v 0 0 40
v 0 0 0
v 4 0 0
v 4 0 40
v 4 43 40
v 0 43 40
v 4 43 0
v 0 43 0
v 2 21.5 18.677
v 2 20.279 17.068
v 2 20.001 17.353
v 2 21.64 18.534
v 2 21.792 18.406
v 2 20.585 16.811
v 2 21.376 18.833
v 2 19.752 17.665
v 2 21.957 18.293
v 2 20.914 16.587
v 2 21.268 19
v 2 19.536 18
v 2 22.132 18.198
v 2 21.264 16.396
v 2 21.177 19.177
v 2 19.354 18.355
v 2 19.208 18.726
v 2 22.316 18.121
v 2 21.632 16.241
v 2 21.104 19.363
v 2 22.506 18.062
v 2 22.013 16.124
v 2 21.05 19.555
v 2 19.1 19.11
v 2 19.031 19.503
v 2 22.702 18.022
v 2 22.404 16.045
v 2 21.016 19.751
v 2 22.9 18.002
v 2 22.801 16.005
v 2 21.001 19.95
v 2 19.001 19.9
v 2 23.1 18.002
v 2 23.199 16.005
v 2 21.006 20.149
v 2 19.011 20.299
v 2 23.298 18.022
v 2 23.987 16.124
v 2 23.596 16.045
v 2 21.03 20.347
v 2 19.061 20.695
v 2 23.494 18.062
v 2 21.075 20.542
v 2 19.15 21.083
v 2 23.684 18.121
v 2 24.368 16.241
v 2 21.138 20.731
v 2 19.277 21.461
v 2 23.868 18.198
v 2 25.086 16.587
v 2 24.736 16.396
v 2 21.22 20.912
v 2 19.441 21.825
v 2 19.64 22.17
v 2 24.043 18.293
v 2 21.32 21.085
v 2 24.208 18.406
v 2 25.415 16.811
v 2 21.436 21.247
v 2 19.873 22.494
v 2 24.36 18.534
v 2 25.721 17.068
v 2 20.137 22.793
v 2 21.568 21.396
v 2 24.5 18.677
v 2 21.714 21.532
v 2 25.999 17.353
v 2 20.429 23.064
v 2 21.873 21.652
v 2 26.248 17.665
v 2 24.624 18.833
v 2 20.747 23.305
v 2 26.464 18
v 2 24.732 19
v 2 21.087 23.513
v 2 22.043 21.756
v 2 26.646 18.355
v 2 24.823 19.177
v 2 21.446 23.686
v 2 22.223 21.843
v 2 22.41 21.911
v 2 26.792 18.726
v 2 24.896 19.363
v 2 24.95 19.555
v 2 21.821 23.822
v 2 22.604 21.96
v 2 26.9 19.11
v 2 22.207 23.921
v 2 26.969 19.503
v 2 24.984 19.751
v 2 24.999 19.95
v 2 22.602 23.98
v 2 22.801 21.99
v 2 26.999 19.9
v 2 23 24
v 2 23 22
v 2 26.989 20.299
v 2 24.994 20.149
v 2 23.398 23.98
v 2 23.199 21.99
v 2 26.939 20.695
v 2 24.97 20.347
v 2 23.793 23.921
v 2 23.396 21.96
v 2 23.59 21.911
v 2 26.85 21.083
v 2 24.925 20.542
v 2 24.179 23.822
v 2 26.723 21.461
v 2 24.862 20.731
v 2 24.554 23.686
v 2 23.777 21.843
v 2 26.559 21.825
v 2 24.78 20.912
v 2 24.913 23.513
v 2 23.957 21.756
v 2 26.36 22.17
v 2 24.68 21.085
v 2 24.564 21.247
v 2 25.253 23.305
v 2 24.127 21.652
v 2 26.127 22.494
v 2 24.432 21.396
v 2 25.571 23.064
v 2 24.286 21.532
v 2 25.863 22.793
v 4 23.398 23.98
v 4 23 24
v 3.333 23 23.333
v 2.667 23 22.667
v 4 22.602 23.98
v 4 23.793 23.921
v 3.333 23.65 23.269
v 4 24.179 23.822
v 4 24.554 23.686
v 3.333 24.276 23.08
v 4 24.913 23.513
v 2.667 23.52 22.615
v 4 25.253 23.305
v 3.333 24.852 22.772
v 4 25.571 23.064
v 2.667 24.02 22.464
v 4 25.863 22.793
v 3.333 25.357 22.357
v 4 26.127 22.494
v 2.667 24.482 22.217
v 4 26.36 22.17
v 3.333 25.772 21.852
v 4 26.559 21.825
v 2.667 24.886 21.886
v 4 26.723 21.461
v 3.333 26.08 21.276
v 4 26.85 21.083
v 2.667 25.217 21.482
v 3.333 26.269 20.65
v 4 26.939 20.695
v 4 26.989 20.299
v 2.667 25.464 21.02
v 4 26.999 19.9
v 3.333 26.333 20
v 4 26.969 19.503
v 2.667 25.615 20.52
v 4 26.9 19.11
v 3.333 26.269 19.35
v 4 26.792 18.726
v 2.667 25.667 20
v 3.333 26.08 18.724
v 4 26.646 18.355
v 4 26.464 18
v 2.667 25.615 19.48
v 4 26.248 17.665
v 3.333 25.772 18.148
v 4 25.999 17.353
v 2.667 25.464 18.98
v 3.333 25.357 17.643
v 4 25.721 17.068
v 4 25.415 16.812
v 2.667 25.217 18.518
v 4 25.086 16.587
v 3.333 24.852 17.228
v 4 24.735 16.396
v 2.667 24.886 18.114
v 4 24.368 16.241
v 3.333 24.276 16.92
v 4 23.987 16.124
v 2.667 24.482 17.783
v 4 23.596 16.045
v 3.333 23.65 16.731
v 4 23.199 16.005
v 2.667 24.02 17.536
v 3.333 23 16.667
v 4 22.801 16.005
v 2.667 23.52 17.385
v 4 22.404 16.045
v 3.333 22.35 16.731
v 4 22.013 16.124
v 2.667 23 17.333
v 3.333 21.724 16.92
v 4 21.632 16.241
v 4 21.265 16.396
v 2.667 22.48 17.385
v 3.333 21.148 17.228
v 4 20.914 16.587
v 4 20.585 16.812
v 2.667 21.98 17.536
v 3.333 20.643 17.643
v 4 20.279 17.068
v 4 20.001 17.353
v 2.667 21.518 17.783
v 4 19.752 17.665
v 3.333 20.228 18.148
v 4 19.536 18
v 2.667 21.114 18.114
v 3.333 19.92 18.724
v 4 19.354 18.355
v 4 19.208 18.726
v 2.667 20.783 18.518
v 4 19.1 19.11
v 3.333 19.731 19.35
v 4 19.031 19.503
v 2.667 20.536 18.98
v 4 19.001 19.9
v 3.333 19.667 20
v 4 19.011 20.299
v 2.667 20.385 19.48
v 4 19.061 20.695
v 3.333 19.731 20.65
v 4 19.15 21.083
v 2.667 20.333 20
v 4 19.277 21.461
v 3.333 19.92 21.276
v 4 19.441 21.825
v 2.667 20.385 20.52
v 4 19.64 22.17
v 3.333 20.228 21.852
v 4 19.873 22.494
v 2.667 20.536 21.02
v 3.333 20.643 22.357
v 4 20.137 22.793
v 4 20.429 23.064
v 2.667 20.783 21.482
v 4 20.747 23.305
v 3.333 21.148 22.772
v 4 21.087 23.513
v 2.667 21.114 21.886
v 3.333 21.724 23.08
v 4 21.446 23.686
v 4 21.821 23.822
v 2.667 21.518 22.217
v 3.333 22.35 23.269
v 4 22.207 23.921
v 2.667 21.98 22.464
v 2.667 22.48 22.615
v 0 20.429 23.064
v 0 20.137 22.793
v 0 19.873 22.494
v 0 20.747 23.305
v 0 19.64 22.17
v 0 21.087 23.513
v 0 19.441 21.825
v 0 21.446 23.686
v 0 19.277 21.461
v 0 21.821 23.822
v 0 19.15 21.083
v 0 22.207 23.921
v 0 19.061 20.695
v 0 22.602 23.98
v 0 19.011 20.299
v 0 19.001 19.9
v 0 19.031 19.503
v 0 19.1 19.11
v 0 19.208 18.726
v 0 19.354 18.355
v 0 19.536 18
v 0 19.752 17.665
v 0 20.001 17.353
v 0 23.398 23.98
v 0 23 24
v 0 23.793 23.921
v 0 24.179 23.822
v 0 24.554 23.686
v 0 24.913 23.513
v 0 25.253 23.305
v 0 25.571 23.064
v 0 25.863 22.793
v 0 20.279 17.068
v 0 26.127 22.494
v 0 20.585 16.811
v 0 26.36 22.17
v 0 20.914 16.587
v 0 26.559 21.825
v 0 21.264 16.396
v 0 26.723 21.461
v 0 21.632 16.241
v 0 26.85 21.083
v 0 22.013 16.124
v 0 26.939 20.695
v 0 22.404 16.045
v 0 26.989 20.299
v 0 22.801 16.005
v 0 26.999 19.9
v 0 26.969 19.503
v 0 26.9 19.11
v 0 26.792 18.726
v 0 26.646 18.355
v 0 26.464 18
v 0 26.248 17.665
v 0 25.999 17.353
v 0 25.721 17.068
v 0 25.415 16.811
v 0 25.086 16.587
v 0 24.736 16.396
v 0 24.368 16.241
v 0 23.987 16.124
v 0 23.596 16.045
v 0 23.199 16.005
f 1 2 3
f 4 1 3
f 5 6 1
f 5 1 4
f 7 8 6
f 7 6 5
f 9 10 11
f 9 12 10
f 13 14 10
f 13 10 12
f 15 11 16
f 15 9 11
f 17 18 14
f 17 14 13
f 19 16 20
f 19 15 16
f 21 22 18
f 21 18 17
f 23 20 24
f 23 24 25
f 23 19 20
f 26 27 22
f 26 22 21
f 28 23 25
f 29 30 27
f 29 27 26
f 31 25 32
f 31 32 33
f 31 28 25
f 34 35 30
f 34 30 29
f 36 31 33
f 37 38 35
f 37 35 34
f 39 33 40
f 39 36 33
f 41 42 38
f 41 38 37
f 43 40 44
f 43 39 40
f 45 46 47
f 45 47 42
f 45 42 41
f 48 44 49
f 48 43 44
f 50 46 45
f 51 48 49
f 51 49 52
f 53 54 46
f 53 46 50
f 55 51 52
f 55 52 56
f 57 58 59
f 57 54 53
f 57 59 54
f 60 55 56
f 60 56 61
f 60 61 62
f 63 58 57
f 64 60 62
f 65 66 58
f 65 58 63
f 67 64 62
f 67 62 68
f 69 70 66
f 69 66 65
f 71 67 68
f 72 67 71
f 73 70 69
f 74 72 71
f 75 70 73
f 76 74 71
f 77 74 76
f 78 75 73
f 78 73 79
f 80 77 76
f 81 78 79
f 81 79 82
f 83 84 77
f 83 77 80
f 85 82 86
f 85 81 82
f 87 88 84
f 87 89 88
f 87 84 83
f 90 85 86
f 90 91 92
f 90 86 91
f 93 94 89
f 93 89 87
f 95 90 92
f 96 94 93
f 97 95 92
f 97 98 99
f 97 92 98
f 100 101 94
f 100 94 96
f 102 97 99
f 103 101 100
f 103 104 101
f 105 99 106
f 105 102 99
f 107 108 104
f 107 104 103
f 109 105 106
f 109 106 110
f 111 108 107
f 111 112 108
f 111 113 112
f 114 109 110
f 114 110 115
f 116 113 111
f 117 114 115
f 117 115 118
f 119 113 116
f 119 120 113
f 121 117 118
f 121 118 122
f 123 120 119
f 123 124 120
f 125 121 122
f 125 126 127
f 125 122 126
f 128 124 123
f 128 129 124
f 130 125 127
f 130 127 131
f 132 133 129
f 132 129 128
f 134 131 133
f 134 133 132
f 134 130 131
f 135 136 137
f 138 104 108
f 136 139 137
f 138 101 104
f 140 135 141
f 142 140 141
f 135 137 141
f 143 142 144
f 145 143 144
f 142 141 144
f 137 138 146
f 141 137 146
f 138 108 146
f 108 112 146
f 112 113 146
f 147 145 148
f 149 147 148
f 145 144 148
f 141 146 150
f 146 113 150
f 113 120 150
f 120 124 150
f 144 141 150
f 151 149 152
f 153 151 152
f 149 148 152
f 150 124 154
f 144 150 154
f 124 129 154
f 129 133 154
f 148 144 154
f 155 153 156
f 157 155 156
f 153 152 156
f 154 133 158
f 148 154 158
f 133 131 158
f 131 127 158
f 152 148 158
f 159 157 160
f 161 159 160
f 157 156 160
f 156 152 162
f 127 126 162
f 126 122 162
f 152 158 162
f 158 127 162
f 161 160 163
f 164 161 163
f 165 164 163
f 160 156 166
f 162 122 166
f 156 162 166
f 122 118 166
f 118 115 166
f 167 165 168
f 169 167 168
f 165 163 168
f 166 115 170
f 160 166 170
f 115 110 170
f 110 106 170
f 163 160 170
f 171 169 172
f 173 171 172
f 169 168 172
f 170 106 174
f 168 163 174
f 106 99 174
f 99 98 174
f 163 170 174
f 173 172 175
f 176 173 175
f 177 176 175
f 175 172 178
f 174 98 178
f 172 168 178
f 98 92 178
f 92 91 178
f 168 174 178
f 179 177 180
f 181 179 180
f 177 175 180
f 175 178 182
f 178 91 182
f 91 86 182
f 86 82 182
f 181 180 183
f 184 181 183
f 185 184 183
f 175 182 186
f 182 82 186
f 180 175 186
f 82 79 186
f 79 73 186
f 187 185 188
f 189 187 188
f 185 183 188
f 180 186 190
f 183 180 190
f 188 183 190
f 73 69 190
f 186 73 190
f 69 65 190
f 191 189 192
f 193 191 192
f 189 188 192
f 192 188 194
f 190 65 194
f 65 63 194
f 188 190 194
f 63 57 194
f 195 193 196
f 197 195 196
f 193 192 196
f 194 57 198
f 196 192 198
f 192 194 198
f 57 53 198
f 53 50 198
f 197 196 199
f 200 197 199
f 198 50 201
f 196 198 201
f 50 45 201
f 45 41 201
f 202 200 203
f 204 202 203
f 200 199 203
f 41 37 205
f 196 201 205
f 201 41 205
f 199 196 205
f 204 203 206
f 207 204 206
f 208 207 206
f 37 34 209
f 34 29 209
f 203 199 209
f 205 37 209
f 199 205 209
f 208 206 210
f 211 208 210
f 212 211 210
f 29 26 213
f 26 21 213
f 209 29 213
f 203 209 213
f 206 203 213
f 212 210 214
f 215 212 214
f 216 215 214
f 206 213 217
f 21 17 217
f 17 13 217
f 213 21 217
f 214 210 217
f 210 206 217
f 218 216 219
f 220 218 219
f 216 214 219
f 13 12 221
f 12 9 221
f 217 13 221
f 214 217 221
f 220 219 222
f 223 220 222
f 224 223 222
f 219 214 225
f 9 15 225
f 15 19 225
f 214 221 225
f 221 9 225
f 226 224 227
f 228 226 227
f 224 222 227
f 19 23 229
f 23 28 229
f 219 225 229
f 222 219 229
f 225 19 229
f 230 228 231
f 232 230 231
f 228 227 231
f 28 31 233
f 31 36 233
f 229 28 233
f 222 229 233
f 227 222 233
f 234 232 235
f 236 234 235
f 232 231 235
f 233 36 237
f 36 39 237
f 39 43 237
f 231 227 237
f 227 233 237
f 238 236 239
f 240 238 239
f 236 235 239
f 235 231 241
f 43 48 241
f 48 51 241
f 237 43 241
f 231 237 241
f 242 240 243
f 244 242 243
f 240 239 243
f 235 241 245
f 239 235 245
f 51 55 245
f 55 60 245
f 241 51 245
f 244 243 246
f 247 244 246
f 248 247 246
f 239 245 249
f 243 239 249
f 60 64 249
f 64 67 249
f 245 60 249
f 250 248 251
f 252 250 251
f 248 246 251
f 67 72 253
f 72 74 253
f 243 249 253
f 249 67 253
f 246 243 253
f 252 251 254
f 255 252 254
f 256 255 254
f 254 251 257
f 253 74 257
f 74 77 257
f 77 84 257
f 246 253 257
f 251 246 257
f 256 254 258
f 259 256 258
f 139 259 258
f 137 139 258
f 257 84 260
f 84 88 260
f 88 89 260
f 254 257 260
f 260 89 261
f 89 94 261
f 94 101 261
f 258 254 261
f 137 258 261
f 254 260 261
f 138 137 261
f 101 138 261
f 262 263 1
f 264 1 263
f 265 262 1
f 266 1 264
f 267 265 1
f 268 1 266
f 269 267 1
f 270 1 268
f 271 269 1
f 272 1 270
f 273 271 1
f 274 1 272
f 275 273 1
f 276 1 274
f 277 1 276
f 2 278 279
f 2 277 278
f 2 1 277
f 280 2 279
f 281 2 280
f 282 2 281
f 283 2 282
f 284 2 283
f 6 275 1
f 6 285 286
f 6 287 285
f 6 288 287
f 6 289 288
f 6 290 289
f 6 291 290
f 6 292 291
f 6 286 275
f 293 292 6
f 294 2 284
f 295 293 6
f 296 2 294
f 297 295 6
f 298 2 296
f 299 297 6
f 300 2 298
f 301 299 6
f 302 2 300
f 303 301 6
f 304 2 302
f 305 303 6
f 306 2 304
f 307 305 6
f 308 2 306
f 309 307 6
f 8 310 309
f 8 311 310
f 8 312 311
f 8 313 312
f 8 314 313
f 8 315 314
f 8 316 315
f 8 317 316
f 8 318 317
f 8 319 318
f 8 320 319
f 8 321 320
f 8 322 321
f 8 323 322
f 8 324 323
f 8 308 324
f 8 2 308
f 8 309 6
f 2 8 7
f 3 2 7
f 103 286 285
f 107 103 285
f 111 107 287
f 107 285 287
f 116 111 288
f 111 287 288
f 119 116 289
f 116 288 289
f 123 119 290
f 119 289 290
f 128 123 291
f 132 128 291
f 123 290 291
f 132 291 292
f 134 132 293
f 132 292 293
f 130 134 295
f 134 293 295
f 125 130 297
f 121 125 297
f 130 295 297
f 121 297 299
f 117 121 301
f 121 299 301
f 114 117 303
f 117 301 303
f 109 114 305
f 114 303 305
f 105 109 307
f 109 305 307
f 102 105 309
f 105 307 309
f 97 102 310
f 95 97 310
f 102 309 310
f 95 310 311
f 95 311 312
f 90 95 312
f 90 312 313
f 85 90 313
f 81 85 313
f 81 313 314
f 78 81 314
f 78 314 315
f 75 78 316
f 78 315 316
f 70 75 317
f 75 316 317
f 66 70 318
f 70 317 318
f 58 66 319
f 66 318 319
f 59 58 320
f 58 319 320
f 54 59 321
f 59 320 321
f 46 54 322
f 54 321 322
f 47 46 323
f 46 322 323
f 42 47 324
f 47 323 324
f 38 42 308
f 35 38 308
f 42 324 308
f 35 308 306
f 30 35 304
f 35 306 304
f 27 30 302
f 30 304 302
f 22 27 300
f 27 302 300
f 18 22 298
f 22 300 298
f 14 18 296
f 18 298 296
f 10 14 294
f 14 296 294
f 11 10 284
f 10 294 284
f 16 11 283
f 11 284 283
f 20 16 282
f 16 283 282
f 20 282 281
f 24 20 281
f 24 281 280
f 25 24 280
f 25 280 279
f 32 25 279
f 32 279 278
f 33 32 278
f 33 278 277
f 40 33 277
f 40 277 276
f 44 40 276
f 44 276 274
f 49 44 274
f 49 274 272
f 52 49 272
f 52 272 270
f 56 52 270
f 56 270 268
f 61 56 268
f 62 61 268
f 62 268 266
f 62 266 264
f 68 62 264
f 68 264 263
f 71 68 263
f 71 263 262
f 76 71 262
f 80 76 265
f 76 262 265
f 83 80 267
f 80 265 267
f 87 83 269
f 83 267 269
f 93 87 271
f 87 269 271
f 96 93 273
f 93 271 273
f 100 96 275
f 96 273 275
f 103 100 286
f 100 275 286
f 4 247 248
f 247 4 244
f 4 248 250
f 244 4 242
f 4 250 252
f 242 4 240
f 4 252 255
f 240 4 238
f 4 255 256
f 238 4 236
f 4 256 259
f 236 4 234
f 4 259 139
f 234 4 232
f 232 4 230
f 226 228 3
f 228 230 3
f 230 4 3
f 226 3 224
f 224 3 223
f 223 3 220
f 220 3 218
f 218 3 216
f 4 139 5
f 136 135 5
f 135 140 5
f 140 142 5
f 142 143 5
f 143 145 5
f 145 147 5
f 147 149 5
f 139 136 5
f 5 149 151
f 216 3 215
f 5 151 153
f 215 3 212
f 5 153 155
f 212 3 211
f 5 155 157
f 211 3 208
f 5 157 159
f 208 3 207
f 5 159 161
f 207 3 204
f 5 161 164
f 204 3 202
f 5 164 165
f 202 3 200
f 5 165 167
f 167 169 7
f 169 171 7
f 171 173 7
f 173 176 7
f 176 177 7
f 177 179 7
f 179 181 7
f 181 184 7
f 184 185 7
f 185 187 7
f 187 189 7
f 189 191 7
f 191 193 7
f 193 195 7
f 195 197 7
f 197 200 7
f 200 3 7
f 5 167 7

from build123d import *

# Parameters (mm, degrees)
ESQUISSE1_W      = 4
ESQUISSE1_H      = 43
EXTRUSION1_DEPTH = 40
ESQUISSE2_R      = 2
EXTRUSION2_DEPTH = 59.864250611
ESQUISSE4_R      = 4
EXTRUSION3_DEPTH = 2
CHANFREIN1_SIZE  = 2


with BuildPart() as part:
    # Esquisse1 → Extrusion1 (new body)
    with BuildSketch(Plane.XY):
        with Locations((2, 21.5)):
            Rectangle(ESQUISSE1_W, ESQUISSE1_H)
    extrude(amount=EXTRUSION1_DEPTH)

    # Esquisse2 → Extrusion2 (cut, through all)
    with BuildSketch(Plane.ZY):
        with Locations((20, 23)):
            Circle(ESQUISSE2_R)
    extrude(amount=-EXTRUSION2_DEPTH, mode=Mode.SUBTRACT)

    # Esquisse4 → Extrusion3 (cut)
    with BuildSketch(Plane.ZY):
        with Locations((20, 23)):
            Circle(ESQUISSE4_R)
    extrude(amount=-EXTRUSION3_DEPTH, mode=Mode.SUBTRACT)

    # Chanfrein1
    chanfrein1_edges = [part.edges().sort_by_distance(p)[0] for p in [
        (4, 23, 18),
    ]]
    chamfer(chanfrein1_edges, length=CHANFREIN1_SIZE - 0.0001)  # a hair under: the kernel refuses the full size


solid = part.part
